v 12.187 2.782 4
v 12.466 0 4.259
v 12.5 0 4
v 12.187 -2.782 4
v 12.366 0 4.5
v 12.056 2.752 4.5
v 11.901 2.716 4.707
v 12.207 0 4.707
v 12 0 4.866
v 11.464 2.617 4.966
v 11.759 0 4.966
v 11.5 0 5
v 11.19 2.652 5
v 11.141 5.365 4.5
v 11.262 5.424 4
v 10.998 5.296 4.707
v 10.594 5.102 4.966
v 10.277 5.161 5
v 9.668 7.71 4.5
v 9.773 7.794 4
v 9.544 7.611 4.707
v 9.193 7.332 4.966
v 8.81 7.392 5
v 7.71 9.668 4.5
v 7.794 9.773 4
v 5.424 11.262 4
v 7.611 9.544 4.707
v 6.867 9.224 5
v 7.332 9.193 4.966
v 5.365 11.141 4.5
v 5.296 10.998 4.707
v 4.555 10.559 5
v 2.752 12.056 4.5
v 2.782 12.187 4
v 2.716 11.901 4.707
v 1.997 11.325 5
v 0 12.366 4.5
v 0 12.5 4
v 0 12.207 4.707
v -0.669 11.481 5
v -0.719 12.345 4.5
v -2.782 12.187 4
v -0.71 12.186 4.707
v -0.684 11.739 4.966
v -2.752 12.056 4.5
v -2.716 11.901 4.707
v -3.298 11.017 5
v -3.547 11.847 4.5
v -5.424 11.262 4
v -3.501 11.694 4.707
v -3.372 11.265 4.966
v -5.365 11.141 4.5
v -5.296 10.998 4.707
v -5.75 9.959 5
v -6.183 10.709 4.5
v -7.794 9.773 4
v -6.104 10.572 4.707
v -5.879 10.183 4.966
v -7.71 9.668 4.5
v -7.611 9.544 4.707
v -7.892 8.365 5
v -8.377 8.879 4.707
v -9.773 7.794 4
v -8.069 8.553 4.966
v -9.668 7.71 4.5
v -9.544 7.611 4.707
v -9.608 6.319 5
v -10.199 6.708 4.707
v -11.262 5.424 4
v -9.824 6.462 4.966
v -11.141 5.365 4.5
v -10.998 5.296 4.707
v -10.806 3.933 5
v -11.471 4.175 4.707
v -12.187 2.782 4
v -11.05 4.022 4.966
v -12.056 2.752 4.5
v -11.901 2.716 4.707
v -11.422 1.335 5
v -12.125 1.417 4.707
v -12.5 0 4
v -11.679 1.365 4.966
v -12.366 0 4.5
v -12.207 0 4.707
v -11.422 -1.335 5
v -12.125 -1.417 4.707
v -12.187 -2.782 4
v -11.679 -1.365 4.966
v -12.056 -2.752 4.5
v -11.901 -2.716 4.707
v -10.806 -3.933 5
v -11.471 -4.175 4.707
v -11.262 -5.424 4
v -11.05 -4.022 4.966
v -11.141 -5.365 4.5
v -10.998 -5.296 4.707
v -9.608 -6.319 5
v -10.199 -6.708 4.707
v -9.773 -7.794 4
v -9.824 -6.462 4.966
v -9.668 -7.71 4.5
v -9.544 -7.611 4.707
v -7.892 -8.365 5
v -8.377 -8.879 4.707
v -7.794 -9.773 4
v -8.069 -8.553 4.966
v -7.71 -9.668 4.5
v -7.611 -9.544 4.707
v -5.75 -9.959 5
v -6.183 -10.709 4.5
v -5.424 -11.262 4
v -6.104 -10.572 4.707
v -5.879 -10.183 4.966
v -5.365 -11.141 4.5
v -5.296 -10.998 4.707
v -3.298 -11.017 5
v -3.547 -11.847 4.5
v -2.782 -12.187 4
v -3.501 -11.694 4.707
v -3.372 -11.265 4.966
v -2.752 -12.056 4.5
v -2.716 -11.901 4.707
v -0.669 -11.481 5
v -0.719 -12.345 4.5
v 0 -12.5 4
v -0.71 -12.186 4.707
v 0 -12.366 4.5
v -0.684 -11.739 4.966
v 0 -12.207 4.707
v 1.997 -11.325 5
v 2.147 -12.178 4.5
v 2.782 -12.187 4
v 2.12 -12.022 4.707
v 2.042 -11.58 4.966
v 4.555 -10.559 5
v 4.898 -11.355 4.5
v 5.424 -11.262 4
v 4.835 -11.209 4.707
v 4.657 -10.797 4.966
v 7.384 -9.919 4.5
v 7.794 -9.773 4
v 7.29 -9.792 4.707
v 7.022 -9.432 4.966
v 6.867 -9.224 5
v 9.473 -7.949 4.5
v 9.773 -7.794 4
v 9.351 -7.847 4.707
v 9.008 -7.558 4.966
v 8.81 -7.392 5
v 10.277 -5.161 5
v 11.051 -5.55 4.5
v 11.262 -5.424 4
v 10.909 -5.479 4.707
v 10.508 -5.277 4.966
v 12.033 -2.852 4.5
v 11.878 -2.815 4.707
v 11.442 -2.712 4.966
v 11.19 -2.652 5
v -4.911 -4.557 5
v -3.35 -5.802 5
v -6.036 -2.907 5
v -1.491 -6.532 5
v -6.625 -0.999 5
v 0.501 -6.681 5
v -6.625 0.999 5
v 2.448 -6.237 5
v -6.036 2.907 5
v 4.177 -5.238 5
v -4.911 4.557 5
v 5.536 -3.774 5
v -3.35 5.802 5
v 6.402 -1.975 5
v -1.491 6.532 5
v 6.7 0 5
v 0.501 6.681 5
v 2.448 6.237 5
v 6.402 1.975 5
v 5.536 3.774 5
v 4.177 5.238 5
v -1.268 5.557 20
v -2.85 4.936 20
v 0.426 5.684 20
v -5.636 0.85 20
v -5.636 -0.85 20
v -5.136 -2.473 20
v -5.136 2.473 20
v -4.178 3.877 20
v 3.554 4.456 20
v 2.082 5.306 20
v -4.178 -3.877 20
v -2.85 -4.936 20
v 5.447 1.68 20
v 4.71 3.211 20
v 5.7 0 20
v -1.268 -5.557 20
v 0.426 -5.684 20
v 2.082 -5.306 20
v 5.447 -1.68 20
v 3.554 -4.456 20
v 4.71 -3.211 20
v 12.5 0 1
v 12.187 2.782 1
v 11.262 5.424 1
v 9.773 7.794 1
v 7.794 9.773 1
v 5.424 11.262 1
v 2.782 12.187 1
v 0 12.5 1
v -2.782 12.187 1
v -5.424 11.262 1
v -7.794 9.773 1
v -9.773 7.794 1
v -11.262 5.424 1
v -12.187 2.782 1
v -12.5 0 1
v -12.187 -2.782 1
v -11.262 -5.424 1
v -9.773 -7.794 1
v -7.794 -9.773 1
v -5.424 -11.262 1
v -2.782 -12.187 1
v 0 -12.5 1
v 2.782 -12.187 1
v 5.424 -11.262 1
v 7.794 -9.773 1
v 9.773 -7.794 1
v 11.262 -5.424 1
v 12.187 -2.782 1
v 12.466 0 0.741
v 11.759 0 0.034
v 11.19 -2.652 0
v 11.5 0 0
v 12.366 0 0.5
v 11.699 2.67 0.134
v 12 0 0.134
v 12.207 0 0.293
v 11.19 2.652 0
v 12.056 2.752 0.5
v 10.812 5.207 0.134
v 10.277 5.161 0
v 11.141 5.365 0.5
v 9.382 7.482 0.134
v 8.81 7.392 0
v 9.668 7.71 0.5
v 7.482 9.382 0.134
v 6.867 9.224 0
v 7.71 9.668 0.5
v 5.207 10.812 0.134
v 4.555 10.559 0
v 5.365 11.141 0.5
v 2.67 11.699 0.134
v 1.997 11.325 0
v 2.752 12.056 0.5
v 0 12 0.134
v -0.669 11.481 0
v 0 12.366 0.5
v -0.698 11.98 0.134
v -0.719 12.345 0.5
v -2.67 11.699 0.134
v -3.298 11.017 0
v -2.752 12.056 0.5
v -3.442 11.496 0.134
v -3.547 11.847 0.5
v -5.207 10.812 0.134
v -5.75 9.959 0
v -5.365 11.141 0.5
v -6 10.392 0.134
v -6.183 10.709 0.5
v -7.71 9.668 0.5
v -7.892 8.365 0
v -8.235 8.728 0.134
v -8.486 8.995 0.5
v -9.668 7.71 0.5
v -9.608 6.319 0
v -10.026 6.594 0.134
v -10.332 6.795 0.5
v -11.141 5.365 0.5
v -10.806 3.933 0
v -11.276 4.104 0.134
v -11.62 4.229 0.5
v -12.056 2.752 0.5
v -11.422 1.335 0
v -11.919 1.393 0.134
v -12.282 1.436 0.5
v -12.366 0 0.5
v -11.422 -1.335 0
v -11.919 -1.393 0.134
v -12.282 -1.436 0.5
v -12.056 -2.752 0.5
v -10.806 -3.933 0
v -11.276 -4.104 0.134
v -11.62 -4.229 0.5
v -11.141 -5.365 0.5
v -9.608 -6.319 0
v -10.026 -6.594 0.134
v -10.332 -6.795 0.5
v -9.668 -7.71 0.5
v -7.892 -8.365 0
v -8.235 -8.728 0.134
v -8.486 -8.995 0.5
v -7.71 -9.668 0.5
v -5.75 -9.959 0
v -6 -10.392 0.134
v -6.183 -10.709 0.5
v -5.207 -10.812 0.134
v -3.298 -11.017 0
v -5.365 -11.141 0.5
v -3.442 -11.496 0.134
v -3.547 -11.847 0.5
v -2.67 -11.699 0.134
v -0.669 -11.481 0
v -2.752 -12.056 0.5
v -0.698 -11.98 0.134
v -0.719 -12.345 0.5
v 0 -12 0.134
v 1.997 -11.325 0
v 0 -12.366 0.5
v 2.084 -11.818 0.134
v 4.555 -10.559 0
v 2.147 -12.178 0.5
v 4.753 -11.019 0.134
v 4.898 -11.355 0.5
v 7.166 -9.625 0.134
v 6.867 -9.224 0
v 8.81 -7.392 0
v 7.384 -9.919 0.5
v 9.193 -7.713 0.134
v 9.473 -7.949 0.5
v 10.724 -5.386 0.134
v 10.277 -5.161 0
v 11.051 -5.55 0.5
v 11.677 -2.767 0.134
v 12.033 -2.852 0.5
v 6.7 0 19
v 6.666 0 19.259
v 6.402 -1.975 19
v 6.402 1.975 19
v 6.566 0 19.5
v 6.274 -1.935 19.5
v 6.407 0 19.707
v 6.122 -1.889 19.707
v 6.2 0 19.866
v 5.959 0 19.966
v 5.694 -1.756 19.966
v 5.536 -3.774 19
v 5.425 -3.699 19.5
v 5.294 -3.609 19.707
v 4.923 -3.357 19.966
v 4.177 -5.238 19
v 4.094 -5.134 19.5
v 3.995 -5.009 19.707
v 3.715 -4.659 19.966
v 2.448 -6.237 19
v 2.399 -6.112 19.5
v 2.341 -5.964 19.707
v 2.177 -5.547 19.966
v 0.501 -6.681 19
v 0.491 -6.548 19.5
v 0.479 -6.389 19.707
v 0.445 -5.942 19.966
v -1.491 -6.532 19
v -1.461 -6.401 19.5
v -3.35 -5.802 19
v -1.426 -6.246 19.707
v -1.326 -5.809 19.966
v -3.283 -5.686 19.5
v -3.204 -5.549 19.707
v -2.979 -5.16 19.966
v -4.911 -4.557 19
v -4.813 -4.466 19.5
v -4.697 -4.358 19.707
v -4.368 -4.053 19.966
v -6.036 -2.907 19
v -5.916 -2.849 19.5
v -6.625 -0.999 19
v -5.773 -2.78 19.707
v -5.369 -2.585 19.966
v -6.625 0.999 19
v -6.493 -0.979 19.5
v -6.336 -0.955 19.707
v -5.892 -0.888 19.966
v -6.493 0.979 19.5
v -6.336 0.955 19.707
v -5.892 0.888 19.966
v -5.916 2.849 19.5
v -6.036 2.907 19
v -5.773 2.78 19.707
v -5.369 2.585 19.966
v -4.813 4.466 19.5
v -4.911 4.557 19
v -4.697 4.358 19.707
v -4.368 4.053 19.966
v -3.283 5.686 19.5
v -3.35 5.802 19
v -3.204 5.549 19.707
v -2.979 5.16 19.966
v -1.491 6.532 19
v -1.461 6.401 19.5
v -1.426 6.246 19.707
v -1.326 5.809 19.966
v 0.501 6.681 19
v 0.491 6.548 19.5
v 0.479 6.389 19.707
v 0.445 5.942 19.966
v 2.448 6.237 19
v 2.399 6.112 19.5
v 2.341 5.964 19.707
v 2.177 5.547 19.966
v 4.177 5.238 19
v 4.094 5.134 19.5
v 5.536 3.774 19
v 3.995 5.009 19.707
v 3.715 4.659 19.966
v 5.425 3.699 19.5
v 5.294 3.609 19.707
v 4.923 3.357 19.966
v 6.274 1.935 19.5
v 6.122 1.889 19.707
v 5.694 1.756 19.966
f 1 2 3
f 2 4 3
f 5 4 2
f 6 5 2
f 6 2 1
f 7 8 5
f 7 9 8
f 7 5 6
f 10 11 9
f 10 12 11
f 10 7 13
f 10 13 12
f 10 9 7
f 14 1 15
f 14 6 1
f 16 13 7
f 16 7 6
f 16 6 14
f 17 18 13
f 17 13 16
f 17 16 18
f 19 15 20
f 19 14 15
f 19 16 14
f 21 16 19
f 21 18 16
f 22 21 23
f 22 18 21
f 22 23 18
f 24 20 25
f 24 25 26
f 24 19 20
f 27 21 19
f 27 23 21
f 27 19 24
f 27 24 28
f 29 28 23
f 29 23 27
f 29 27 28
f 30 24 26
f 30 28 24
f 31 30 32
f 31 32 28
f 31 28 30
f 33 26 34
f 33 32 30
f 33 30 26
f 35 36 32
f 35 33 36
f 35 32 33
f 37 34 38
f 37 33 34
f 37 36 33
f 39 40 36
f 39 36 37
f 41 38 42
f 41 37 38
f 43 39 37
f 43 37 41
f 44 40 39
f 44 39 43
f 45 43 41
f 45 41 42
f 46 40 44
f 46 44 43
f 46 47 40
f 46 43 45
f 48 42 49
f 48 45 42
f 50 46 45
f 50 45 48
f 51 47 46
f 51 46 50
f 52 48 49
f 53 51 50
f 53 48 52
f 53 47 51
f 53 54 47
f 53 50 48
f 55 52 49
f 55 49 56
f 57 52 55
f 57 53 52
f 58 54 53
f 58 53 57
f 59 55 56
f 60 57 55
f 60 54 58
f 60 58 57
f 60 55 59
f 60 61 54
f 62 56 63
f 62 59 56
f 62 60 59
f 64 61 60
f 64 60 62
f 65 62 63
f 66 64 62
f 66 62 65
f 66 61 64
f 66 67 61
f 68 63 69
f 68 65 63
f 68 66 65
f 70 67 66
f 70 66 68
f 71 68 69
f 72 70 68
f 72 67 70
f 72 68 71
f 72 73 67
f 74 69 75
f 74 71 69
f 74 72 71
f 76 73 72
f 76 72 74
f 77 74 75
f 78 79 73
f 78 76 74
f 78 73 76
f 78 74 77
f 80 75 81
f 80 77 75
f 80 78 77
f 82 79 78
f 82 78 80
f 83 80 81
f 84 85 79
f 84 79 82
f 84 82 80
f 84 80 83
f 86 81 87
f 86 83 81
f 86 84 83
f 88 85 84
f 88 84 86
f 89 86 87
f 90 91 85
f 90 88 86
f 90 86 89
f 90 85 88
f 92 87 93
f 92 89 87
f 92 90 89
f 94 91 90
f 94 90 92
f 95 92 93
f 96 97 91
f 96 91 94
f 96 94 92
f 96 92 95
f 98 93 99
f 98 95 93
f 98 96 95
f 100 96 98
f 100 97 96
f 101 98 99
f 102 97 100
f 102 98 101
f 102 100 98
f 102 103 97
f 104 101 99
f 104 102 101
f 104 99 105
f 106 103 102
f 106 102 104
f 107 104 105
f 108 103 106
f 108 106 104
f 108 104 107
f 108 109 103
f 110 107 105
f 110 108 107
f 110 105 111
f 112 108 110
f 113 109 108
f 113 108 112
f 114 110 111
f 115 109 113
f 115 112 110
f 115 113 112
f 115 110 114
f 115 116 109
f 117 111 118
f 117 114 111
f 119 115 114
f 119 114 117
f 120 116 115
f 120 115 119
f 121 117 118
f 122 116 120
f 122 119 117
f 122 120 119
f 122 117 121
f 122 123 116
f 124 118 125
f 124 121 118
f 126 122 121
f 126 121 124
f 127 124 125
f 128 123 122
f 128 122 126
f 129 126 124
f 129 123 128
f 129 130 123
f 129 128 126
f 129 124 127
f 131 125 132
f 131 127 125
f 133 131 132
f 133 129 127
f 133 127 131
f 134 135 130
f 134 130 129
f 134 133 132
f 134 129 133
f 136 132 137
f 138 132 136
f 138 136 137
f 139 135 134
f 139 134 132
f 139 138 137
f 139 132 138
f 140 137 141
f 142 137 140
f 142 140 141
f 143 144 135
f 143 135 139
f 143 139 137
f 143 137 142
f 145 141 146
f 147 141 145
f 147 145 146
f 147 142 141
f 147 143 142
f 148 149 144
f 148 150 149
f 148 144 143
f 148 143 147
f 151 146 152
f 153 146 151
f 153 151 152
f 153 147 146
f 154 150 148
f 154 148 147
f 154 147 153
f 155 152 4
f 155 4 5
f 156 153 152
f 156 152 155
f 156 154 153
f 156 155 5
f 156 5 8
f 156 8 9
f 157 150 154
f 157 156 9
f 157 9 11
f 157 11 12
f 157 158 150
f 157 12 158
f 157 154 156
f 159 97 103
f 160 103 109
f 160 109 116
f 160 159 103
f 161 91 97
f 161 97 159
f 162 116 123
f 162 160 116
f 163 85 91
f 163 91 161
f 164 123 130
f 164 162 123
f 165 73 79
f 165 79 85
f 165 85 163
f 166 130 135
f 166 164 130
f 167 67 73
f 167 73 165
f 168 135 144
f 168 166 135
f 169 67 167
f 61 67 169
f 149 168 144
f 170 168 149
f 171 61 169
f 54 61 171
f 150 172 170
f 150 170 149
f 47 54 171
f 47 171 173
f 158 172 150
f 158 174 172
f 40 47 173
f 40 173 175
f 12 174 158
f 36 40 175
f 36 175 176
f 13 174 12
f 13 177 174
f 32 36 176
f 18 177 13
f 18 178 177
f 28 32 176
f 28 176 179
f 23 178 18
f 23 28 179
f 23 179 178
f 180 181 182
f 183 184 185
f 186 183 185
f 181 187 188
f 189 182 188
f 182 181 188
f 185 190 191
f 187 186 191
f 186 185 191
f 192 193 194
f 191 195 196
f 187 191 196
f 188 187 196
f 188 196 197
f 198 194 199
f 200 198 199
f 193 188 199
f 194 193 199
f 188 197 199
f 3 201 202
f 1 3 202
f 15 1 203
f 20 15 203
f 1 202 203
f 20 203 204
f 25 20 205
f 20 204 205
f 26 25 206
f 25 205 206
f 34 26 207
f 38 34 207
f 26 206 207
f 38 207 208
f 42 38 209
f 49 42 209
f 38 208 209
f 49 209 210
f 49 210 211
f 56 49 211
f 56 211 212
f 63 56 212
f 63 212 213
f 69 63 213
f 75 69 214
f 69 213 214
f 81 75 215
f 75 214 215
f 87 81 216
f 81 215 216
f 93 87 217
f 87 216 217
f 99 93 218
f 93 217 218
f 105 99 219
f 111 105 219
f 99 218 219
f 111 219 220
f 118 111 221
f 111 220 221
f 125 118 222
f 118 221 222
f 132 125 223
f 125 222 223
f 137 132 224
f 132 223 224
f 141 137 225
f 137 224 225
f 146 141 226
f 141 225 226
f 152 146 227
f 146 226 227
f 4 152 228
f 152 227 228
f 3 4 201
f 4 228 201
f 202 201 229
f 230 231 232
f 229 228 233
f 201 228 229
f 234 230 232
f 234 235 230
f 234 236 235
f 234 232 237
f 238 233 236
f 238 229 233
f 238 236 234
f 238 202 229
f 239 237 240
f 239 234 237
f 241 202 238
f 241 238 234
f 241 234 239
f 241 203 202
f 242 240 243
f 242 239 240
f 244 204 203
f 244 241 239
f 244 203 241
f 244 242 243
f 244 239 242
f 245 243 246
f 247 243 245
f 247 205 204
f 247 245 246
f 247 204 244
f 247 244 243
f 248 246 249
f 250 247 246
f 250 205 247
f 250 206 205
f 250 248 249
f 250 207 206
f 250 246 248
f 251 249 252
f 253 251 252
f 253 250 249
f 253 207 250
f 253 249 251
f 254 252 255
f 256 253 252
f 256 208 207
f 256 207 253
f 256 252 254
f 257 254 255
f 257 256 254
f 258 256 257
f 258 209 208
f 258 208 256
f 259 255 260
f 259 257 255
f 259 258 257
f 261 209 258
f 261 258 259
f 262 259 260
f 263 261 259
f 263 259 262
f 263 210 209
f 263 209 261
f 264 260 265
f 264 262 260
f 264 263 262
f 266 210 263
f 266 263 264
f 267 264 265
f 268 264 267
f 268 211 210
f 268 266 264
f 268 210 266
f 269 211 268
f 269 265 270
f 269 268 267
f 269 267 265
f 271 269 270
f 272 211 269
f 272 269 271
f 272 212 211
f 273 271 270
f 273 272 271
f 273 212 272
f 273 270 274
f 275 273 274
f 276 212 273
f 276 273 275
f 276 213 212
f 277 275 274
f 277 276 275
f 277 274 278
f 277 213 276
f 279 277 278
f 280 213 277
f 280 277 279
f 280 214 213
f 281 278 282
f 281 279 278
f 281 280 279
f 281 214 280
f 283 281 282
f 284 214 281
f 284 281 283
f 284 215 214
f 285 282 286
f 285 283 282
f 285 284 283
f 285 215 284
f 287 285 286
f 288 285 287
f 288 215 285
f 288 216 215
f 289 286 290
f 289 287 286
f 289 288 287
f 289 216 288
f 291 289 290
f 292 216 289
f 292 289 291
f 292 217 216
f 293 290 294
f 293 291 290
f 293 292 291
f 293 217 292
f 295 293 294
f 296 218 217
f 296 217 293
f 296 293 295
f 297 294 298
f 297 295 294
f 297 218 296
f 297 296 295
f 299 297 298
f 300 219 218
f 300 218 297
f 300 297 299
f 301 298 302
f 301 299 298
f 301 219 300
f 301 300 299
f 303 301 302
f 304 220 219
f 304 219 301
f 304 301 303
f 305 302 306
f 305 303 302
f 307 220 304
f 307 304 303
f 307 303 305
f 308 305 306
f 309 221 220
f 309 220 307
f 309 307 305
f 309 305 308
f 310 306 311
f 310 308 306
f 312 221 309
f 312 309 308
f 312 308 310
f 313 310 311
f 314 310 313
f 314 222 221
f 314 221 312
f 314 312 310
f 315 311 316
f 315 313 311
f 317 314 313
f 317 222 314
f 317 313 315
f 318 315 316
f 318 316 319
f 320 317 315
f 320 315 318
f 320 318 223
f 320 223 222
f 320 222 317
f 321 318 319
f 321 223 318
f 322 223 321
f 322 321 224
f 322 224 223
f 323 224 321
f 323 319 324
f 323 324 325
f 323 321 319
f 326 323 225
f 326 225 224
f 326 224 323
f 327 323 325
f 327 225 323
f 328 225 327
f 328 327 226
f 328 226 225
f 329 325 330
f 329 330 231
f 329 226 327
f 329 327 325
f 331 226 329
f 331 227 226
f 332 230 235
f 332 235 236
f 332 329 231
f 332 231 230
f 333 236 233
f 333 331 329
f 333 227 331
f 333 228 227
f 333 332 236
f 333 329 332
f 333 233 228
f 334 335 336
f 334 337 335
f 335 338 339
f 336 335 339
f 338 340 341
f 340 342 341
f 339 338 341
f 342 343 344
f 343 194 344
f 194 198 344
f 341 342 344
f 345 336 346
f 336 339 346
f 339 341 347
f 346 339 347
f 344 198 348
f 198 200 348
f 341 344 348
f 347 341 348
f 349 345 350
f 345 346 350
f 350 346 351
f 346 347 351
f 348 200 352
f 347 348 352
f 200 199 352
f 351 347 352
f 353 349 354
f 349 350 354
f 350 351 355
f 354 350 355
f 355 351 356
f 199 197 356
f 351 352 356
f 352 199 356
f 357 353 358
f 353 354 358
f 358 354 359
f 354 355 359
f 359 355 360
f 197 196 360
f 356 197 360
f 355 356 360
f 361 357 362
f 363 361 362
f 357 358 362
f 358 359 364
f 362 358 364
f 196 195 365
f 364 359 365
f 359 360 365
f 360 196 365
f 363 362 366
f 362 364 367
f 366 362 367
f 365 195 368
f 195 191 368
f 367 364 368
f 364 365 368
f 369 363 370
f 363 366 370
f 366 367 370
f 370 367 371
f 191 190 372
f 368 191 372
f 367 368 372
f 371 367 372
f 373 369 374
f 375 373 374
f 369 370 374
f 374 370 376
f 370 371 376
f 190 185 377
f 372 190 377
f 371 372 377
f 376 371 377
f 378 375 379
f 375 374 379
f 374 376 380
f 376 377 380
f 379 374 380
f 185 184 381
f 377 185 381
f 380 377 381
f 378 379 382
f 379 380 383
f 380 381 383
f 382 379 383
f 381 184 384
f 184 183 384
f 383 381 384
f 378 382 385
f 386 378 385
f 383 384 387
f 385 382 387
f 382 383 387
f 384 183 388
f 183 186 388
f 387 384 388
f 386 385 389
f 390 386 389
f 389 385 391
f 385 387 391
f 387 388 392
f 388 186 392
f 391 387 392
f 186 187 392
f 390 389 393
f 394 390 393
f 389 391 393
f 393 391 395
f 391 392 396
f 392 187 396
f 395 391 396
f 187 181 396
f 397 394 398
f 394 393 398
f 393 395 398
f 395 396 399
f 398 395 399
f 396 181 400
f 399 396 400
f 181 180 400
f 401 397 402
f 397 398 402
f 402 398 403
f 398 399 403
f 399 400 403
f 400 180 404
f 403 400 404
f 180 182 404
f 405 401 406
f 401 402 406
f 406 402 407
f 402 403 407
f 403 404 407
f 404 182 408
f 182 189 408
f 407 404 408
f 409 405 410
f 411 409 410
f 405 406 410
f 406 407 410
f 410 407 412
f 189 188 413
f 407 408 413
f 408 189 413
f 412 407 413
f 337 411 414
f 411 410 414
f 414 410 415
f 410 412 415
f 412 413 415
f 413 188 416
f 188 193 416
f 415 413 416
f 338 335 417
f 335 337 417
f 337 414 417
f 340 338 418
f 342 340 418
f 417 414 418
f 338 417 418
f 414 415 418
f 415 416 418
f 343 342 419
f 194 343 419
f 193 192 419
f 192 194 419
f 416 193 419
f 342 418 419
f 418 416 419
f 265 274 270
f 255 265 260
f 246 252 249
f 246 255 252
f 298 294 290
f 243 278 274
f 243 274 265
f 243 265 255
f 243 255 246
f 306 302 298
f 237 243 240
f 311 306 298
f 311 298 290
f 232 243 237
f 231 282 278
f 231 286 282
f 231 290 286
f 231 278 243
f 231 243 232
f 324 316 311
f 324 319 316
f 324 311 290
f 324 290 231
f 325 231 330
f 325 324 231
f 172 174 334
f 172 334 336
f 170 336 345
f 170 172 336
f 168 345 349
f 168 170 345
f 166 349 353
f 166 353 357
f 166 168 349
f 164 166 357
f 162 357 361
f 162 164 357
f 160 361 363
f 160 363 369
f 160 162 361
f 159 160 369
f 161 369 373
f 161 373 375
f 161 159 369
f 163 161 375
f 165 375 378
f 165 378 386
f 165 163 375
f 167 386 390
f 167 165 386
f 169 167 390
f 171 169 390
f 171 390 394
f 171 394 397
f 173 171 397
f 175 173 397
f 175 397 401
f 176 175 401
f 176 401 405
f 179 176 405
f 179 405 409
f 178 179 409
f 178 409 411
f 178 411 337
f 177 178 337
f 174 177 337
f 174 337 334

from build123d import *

# Parameters (mm, degrees)
F0_R     = 12.5
F1_DEPTH = 5
F2_R     = 6.7
F3_DEPTH = 20
F4_R     = 1


with BuildPart() as f1:
    # F0 (on Top) → F1 (new body)
    with BuildSketch(Plane.XY):
        Circle(F0_R)
    extrude(amount=F1_DEPTH)

    # F2 (on face) → F3 (join)
    with BuildSketch(Plane(origin=(0, 0, 0), x_dir=(1, 0, 0), z_dir=(0, 0, -1))):
        Circle(F2_R)
    extrude(amount=-F3_DEPTH)

    # F4
    f4_edges = [f1.edges().sort_by_distance(p)[0] for p in [
        (-12.5, 0, 0),
        (-12.5, 0, 5),
        (-6.7, 0, 20),
    ]]
    fillet(f4_edges, radius=F4_R)


solid = f1.part
